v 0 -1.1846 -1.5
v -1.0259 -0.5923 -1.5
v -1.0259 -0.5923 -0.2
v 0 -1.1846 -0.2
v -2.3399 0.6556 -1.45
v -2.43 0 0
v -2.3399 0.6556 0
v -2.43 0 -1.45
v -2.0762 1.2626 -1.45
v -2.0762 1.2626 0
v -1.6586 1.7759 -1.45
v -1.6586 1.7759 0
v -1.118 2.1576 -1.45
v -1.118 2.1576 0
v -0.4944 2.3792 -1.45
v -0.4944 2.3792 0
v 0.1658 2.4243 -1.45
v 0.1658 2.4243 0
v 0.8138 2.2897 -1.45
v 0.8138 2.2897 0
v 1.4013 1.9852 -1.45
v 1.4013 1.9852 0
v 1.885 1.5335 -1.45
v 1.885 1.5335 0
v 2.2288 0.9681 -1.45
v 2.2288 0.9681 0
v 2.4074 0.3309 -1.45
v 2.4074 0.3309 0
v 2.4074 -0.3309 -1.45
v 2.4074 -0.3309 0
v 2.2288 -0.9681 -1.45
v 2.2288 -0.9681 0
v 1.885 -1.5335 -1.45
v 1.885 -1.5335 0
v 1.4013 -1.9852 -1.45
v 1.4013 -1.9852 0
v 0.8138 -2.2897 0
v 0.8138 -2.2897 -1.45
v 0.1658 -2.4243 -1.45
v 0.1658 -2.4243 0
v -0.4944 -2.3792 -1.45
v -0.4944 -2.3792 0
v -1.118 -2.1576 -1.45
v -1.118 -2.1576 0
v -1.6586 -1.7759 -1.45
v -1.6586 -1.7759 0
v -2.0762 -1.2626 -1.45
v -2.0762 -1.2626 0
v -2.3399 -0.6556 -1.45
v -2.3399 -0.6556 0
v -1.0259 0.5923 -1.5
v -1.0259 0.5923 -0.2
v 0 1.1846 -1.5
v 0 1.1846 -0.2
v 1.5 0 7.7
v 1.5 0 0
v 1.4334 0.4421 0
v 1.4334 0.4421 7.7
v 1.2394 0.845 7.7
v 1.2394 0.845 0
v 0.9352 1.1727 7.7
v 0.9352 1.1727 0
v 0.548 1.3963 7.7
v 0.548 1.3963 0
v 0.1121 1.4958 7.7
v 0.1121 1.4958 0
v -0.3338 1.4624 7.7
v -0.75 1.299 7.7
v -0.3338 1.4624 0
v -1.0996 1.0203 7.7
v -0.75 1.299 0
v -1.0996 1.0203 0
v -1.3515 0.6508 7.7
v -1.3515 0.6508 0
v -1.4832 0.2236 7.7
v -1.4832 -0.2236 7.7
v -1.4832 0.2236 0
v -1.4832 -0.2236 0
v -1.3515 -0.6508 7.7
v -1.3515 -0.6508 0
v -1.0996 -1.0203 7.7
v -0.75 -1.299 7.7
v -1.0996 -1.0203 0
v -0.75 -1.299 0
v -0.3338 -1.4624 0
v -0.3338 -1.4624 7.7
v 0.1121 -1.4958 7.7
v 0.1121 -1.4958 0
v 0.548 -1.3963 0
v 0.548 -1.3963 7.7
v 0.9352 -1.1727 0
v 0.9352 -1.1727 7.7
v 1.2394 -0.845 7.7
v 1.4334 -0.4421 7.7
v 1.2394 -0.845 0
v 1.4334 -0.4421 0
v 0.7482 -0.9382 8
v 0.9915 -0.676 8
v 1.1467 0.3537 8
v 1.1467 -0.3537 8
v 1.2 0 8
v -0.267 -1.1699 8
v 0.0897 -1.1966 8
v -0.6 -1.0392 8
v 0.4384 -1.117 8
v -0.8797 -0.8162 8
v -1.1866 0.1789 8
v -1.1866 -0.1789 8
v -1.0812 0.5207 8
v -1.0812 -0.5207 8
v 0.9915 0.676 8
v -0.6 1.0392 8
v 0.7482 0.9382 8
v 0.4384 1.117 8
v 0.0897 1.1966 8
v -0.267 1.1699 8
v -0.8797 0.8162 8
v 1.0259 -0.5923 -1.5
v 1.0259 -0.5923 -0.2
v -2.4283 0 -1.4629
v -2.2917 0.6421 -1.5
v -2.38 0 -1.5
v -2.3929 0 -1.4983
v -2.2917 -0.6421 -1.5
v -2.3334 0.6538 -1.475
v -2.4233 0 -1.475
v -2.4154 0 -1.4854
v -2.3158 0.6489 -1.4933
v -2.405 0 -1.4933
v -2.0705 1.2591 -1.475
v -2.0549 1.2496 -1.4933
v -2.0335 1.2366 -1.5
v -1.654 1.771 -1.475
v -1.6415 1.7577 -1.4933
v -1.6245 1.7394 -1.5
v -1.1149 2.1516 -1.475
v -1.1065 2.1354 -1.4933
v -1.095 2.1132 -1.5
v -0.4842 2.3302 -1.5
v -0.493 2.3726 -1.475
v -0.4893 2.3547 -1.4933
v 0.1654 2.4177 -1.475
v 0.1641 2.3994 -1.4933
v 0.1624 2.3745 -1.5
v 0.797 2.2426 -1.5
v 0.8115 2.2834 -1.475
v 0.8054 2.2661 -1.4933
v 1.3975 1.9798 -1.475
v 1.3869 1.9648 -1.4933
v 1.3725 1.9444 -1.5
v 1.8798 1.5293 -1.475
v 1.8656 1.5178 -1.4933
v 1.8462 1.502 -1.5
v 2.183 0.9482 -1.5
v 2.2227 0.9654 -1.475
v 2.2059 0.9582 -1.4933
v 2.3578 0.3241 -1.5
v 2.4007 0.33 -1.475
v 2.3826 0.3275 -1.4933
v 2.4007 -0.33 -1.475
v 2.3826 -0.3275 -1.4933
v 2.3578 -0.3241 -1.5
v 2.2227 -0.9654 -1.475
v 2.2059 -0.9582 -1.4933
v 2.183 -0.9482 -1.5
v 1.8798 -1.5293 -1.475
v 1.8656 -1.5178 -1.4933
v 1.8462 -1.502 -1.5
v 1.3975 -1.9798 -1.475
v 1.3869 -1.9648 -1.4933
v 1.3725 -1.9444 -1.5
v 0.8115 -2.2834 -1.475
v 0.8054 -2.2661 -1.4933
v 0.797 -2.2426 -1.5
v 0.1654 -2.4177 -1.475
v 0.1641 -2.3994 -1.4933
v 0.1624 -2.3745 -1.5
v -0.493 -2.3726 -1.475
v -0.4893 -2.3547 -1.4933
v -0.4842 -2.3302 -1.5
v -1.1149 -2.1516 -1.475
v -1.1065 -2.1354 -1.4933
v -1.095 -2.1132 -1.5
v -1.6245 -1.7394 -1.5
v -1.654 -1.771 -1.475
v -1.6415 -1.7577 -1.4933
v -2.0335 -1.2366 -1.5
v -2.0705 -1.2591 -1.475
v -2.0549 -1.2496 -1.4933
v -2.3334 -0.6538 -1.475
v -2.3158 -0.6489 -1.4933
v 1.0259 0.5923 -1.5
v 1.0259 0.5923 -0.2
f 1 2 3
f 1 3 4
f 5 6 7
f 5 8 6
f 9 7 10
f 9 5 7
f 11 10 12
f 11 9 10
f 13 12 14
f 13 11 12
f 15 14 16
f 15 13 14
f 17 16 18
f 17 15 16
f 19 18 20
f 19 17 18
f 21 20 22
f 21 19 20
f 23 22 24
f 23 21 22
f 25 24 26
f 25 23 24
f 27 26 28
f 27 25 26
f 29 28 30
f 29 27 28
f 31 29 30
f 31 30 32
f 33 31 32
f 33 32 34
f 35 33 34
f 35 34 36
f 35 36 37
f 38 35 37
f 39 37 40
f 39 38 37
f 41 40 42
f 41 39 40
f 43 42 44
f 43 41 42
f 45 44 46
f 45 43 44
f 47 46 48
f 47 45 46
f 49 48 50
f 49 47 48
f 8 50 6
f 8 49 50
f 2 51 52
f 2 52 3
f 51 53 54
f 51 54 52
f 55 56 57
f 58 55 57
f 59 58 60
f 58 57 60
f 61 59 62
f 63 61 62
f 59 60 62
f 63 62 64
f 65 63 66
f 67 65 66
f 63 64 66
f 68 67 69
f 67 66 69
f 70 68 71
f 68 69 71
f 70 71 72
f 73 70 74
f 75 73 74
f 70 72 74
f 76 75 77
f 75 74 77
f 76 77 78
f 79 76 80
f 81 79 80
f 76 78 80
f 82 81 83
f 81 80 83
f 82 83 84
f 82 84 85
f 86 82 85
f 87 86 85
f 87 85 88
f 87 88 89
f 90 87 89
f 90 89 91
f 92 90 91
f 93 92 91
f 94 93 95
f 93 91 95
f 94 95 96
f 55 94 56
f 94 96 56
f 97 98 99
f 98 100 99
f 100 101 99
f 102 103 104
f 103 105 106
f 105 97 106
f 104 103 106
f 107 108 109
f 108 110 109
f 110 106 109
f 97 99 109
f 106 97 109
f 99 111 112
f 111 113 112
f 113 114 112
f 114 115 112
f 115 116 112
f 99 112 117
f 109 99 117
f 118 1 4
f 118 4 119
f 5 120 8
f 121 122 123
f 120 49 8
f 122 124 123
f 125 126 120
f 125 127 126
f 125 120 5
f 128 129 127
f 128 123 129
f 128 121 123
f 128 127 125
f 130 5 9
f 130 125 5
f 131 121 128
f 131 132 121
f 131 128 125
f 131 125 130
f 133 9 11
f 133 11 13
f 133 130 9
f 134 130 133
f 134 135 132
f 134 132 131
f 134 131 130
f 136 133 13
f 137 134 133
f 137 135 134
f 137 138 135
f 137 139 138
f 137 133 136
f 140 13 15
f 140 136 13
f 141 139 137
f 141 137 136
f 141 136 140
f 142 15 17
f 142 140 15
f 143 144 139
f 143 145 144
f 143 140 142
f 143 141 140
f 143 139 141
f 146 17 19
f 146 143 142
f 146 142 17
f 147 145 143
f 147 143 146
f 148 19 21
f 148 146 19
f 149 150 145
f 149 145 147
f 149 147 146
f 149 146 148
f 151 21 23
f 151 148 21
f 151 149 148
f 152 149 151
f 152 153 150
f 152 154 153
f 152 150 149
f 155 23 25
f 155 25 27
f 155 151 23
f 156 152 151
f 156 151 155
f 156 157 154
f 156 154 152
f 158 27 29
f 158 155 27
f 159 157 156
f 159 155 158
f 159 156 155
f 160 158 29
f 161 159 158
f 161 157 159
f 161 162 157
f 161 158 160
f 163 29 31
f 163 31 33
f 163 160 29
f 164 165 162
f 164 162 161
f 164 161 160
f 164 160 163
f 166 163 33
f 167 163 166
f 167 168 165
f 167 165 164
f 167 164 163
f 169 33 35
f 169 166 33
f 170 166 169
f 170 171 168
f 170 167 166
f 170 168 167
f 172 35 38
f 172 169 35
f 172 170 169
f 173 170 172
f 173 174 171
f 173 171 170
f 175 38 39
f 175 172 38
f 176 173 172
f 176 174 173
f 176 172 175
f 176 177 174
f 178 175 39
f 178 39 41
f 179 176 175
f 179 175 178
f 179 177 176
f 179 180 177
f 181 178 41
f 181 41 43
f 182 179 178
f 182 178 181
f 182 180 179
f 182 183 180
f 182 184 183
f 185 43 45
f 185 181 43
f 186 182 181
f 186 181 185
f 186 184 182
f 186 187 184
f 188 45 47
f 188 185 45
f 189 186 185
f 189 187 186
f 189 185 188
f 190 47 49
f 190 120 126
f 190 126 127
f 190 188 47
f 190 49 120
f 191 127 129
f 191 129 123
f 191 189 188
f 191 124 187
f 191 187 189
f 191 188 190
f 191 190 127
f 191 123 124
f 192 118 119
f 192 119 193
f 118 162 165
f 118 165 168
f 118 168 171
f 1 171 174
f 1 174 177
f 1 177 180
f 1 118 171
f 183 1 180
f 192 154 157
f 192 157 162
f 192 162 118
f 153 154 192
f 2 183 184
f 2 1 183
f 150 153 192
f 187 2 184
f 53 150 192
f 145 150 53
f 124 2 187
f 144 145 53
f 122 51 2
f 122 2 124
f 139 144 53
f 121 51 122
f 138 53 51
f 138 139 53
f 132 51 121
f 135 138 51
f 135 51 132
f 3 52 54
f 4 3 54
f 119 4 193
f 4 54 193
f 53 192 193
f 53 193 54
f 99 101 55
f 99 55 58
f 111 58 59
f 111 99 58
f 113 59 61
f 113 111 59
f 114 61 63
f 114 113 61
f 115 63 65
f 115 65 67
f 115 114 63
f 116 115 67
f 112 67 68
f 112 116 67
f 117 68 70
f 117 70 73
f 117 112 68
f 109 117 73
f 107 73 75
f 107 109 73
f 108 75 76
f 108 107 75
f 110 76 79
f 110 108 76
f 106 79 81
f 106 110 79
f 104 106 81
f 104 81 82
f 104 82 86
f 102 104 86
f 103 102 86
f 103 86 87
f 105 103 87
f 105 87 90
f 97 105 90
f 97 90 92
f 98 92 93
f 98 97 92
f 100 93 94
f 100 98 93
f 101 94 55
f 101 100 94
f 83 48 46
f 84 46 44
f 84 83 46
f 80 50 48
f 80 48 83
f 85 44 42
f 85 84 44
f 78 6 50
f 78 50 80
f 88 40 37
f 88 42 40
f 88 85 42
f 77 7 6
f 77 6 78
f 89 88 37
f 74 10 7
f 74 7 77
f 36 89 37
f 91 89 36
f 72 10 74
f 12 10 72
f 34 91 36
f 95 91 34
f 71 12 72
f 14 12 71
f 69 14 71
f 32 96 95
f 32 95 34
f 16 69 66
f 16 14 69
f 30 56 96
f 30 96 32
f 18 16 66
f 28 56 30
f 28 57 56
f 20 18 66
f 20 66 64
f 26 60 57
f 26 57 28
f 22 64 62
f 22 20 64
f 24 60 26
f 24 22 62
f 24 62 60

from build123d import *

# Parameters (mm, degrees)
ENLEV_MAT_EXTRU1_DEPTH = 1.3
ESQUISSE3_W            = 1.5
ESQUISSE3_H            = 8
CHANFREIN1_SIZE        = 0.3


with BuildPart() as part:
    # Esquisse1 → Base-Révolution (revolve)
    with BuildSketch(Plane(origin=(0, 0, 0), x_dir=(1, 0, 0), z_dir=(0, 1, 0)), mode=Mode.PRIVATE) as base_r_volution_sk:
        with BuildLine():
            Line((0, 0), (2.43, 0))
            Line((2.43, 0), (2.43, 1.45))
            ThreePointArc((2.43, 1.45), (2.415355339, 1.485355339), (2.38, 1.5))
            Line((2.38, 1.5), (0, 1.5))
            Line((0, 1.5), (0, 0))
        make_face()
    revolve(base_r_volution_sk.sketch.rotate(Axis((0, 0, 0), (0, 0, -1)), 180), axis=Axis((0, 0, 0), (0, 0, -1)))

    # Esquisse2 → enlev-mat-Extru1 (cut)
    with BuildSketch(Plane.XY.offset(-1.5)):
        Polygon((1.025891605, -0.592298794), (1.025891605, 0.592298794), (0, 1.184597588), (-1.025891605, 0.592298794), (-1.025891605, -0.592298794), (0, -1.184597588), align=None)
    extrude(amount=ENLEV_MAT_EXTRU1_DEPTH, mode=Mode.SUBTRACT)

    # Esquisse3 → Boss.-Révol.1 (revolve)
    with BuildSketch(Plane(origin=(0, 0, 0), x_dir=(1, 0, 0), z_dir=(0, 1, 0))):
        with Locations((0.75, -4)):
            Rectangle(ESQUISSE3_W, ESQUISSE3_H)
    revolve(axis=Axis((0, 0, 0), (0, 0, 1)))

    # Chanfrein1
    chanfrein1_edges = [part.edges().sort_by_distance(p)[0] for p in [
        (-1.5, 0, 8),
    ]]
    chamfer(chanfrein1_edges, length=CHANFREIN1_SIZE)


solid = part.part
